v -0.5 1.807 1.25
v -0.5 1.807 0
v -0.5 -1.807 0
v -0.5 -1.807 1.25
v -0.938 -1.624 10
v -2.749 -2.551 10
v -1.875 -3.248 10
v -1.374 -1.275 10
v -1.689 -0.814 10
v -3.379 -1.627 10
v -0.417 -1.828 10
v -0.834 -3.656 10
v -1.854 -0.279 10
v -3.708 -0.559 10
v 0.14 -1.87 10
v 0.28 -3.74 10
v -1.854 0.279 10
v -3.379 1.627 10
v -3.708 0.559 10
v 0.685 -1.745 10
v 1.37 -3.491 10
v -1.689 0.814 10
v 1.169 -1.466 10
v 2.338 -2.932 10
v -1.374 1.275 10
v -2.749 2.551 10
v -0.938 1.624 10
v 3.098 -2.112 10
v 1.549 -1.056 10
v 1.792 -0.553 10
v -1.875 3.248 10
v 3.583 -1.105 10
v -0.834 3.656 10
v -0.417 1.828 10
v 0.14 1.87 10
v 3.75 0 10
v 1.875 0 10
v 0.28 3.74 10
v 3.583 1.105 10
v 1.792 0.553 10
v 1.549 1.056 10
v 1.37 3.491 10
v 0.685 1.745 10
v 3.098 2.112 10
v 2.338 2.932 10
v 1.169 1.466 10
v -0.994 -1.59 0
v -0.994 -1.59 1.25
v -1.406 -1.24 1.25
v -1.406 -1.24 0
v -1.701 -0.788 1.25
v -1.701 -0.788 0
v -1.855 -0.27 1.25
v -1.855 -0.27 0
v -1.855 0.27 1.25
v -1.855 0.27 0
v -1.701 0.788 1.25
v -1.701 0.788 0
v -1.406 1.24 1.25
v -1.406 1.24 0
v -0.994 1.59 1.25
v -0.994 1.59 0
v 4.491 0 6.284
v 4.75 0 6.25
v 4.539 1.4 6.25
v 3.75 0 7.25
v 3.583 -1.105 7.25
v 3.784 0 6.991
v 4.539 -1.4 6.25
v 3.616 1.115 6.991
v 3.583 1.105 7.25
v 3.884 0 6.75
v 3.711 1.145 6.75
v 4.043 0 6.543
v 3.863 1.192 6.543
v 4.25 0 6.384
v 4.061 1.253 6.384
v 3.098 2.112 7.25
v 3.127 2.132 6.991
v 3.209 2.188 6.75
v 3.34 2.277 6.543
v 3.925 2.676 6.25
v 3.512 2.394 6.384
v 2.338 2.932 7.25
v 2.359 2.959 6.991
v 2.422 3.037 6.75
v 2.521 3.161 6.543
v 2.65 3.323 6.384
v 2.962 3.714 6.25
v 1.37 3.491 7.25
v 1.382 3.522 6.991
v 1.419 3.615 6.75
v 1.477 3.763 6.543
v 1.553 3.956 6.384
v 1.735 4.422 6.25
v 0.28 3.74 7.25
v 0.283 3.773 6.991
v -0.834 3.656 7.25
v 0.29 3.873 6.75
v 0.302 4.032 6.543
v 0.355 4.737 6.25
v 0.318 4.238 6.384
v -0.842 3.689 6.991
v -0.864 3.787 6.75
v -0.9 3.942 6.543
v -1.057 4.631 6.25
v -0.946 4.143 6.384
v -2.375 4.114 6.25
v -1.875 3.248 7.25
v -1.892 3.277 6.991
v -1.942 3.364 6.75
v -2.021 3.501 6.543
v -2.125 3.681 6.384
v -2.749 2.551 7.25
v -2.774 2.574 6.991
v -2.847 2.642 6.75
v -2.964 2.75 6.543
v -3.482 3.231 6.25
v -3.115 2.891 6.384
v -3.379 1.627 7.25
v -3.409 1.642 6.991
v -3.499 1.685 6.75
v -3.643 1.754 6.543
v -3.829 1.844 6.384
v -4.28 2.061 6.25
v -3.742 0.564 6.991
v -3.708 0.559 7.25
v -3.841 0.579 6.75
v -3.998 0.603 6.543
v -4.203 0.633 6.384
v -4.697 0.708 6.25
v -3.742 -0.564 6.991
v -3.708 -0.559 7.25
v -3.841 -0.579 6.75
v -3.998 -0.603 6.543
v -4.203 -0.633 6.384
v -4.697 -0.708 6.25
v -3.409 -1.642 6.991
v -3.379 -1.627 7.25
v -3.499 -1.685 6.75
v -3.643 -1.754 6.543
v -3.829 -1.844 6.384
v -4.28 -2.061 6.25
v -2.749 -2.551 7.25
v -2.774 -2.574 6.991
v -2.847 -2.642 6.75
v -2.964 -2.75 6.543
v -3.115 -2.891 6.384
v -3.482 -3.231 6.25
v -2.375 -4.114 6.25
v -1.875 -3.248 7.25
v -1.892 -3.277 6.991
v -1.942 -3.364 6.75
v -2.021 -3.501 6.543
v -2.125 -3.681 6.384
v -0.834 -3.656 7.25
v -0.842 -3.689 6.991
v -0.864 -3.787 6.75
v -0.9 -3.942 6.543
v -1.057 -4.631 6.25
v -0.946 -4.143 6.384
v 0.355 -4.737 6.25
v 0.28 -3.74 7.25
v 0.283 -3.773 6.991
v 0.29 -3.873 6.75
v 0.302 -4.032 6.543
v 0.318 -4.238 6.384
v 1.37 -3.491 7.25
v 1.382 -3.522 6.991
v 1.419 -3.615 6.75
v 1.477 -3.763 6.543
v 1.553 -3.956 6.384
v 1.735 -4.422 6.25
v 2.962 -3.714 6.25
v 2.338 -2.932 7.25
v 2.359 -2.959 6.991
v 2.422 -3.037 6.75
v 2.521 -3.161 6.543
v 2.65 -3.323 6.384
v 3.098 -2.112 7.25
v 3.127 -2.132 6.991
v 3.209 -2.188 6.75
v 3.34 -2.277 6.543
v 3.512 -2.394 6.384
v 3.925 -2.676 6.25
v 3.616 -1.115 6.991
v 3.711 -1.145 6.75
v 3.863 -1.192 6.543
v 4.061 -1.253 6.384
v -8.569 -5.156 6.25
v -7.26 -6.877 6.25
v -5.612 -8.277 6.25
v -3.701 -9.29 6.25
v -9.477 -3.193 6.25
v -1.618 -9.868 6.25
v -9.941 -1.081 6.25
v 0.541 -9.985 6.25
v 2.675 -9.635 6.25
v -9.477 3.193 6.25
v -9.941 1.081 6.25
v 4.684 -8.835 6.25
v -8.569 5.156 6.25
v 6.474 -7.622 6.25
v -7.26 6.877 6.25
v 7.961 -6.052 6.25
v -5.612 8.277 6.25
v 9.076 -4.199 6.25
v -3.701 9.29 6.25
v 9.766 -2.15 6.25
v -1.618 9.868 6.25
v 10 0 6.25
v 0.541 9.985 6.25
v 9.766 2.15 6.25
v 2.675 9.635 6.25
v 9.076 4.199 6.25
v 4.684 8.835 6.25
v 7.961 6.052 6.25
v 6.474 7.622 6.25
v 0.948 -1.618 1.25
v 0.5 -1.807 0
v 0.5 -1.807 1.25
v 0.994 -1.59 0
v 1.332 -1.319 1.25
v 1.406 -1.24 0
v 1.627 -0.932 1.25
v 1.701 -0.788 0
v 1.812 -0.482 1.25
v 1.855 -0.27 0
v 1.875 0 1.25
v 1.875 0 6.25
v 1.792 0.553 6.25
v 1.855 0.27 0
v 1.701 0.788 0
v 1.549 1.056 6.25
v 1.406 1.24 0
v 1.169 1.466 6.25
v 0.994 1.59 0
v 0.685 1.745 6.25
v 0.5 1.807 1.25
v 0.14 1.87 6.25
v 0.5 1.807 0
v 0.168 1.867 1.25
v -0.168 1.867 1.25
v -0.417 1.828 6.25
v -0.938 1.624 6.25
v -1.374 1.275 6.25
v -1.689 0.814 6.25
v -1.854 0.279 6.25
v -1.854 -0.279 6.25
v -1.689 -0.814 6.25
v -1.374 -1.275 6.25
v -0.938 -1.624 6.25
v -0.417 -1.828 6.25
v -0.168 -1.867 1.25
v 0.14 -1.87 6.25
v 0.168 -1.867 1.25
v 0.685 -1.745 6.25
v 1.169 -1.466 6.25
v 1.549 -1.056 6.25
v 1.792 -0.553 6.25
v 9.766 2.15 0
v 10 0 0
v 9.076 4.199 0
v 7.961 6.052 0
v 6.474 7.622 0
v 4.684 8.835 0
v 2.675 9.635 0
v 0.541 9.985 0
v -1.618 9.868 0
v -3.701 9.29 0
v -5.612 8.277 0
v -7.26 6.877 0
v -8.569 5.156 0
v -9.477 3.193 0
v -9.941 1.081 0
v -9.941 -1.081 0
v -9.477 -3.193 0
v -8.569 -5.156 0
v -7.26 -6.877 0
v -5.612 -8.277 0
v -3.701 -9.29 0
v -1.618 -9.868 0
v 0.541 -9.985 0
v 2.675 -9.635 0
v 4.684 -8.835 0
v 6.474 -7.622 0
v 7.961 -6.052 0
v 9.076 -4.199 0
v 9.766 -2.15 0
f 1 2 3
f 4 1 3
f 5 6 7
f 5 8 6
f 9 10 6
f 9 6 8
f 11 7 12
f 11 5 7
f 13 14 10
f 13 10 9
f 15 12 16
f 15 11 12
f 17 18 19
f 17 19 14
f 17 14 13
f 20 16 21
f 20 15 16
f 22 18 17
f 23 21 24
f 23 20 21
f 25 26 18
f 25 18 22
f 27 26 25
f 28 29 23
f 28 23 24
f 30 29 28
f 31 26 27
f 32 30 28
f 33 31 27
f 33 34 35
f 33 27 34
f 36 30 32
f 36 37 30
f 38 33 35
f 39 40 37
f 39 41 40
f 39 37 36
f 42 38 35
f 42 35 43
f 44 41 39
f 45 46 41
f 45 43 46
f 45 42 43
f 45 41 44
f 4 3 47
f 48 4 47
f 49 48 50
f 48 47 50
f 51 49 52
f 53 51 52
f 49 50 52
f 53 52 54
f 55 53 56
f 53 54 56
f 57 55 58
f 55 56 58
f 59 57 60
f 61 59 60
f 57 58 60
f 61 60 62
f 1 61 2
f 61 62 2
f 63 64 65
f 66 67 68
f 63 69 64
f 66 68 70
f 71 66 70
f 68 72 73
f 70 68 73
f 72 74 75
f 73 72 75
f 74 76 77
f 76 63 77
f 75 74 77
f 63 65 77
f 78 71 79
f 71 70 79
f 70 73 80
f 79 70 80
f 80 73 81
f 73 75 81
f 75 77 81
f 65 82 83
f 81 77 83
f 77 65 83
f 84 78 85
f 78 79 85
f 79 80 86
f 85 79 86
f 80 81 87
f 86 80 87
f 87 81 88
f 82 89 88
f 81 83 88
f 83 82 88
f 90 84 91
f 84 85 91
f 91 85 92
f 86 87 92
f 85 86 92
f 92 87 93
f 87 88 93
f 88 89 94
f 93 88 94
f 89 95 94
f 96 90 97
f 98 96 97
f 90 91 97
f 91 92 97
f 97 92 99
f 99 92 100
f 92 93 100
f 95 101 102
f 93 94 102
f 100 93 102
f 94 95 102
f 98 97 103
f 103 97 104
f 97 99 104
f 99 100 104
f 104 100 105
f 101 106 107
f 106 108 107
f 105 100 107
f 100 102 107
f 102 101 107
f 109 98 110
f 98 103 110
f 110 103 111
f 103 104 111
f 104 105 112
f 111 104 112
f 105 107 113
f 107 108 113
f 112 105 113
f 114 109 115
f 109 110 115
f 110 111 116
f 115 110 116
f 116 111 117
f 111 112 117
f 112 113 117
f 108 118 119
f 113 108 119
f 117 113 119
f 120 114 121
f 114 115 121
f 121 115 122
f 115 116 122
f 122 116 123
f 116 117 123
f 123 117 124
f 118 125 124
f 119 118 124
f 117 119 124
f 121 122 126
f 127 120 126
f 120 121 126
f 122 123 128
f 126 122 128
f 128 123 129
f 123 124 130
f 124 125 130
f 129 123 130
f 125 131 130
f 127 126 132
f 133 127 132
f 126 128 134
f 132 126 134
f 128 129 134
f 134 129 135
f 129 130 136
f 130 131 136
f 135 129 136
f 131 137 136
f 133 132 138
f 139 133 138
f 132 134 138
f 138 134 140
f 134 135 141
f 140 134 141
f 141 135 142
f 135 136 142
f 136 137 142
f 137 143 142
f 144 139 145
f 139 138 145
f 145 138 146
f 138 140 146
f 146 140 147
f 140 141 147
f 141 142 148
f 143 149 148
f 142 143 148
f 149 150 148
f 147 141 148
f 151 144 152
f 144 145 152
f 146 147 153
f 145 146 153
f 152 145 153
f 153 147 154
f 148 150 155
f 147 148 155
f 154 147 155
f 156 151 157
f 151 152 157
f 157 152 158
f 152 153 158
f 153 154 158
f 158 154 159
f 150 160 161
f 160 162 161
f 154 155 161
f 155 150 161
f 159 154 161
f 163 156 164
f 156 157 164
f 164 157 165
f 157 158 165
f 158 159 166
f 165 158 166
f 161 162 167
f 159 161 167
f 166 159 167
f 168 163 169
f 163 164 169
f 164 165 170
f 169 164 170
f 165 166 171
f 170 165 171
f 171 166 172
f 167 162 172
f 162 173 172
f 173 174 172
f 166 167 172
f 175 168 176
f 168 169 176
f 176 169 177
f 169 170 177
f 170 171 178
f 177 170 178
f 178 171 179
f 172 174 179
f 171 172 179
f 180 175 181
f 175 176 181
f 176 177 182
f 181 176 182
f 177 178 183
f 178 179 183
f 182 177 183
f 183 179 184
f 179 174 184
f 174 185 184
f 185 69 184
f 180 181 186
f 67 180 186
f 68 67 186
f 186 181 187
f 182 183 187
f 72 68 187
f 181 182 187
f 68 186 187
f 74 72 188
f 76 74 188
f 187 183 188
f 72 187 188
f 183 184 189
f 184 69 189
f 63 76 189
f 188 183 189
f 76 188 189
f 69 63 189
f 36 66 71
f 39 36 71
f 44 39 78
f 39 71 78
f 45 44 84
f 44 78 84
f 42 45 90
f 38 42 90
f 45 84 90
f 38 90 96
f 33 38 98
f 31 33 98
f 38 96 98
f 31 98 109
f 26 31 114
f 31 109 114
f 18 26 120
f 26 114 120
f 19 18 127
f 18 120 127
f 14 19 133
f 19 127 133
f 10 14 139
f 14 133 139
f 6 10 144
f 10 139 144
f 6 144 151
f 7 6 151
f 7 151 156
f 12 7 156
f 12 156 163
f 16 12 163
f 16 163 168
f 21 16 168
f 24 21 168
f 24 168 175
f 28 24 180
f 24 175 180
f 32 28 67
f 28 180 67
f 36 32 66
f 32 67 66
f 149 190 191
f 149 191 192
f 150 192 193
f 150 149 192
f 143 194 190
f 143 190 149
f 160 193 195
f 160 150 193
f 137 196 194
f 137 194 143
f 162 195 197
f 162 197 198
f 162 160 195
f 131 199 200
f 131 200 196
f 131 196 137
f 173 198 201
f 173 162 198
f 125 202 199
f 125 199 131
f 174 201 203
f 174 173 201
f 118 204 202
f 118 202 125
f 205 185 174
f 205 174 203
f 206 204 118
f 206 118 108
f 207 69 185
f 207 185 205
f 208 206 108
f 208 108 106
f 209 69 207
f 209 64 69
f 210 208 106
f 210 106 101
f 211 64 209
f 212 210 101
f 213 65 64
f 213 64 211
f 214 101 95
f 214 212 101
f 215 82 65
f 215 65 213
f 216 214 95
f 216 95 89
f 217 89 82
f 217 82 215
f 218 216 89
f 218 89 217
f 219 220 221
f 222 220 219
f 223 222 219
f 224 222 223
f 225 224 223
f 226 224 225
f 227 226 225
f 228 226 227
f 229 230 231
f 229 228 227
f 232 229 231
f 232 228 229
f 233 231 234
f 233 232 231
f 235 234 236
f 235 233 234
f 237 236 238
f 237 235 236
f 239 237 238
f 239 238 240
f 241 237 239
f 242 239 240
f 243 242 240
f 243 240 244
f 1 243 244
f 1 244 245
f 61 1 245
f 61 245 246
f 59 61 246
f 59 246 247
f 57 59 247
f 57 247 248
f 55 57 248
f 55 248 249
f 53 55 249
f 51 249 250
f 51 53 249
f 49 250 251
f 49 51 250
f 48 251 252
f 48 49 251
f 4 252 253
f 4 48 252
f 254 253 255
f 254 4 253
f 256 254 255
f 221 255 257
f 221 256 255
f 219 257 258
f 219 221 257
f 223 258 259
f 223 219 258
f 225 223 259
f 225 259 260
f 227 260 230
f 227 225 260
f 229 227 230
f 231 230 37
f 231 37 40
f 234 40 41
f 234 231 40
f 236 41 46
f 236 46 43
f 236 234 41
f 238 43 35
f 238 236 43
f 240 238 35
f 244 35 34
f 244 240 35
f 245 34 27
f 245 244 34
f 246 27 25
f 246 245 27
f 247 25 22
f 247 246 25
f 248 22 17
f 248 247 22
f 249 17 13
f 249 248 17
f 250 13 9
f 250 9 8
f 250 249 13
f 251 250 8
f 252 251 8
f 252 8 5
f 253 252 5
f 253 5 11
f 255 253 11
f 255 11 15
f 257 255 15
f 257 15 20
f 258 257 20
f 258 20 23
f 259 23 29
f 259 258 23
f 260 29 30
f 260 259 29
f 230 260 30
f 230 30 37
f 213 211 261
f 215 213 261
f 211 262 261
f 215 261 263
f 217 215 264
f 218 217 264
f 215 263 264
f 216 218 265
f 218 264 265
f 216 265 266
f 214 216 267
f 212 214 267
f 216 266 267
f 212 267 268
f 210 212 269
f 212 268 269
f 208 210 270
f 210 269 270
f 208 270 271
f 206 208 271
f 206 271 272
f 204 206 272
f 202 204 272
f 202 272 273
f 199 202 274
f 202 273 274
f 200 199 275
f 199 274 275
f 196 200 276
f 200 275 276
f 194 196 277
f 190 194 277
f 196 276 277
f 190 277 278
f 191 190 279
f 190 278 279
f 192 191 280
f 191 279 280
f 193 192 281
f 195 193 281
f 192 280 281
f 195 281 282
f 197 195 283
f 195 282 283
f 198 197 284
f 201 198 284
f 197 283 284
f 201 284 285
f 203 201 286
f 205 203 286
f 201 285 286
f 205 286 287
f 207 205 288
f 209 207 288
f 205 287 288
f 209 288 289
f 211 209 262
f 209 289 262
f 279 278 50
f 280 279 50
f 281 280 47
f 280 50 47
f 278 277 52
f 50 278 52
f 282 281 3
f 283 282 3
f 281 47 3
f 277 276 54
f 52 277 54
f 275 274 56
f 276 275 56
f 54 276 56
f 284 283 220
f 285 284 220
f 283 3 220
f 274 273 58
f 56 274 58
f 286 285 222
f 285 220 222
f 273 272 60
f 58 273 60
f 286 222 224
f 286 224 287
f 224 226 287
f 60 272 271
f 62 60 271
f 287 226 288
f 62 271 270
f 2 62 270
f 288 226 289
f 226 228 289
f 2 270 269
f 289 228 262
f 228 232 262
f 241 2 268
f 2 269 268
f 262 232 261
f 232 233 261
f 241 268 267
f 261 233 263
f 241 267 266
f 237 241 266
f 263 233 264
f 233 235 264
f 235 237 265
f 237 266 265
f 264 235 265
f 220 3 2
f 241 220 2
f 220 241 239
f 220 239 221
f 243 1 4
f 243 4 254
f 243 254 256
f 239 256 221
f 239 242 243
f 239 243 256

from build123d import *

# Parameters (mm, degrees)
SKETCH1_R           = 10
BOSS_EXTRUDE1_DEPTH = 1.25
SKETCH2_R           = 10
SKETCH2_R_2         = 1.875
BOSS_EXTRUDE2_DEPTH = 5
SKETCH3_R           = 3.75
SKETCH3_R_2         = 1.875
BOSS_EXTRUDE3_DEPTH = 3.75
FILLET1_R           = 1


with BuildPart() as part:
    # Sketch1 → Boss-Extrude1 (new body)
    with BuildSketch(Plane.XY):
        Circle(SKETCH1_R)
        with BuildLine():
            Line((-0.5, 1.807104037), (-0.5, -1.807104037))
            ThreePointArc((-0.5, -1.807104037), (-1.875, 0), (-0.5, 1.807104037))
        make_face(mode=Mode.SUBTRACT)
        with BuildLine():
            Line((0.5, 1.807104037), (0.5, -1.807104037))
            ThreePointArc((0.5, -1.807104037), (1.875, 0), (0.5, 1.807104037))
        make_face(mode=Mode.SUBTRACT)
    extrude(amount=BOSS_EXTRUDE1_DEPTH)

    # Sketch2 → Boss-Extrude2 (add)
    with BuildSketch(Plane.XY.offset(1.25)):
        Circle(SKETCH2_R)
        Circle(SKETCH2_R_2, mode=Mode.SUBTRACT)
    extrude(amount=BOSS_EXTRUDE2_DEPTH)

    # Sketch3 → Boss-Extrude3 (add)
    with BuildSketch(Plane.XY.offset(6.25)):
        Circle(SKETCH3_R)
        Circle(SKETCH3_R_2, mode=Mode.SUBTRACT)
    extrude(amount=BOSS_EXTRUDE3_DEPTH)

    # Fillet1
    fillet1_edges = [part.edges().sort_by_distance(p)[0] for p in [
        (-3.75, 0, 6.25),
    ]]
    fillet(fillet1_edges, radius=FILLET1_R)


solid = part.part
